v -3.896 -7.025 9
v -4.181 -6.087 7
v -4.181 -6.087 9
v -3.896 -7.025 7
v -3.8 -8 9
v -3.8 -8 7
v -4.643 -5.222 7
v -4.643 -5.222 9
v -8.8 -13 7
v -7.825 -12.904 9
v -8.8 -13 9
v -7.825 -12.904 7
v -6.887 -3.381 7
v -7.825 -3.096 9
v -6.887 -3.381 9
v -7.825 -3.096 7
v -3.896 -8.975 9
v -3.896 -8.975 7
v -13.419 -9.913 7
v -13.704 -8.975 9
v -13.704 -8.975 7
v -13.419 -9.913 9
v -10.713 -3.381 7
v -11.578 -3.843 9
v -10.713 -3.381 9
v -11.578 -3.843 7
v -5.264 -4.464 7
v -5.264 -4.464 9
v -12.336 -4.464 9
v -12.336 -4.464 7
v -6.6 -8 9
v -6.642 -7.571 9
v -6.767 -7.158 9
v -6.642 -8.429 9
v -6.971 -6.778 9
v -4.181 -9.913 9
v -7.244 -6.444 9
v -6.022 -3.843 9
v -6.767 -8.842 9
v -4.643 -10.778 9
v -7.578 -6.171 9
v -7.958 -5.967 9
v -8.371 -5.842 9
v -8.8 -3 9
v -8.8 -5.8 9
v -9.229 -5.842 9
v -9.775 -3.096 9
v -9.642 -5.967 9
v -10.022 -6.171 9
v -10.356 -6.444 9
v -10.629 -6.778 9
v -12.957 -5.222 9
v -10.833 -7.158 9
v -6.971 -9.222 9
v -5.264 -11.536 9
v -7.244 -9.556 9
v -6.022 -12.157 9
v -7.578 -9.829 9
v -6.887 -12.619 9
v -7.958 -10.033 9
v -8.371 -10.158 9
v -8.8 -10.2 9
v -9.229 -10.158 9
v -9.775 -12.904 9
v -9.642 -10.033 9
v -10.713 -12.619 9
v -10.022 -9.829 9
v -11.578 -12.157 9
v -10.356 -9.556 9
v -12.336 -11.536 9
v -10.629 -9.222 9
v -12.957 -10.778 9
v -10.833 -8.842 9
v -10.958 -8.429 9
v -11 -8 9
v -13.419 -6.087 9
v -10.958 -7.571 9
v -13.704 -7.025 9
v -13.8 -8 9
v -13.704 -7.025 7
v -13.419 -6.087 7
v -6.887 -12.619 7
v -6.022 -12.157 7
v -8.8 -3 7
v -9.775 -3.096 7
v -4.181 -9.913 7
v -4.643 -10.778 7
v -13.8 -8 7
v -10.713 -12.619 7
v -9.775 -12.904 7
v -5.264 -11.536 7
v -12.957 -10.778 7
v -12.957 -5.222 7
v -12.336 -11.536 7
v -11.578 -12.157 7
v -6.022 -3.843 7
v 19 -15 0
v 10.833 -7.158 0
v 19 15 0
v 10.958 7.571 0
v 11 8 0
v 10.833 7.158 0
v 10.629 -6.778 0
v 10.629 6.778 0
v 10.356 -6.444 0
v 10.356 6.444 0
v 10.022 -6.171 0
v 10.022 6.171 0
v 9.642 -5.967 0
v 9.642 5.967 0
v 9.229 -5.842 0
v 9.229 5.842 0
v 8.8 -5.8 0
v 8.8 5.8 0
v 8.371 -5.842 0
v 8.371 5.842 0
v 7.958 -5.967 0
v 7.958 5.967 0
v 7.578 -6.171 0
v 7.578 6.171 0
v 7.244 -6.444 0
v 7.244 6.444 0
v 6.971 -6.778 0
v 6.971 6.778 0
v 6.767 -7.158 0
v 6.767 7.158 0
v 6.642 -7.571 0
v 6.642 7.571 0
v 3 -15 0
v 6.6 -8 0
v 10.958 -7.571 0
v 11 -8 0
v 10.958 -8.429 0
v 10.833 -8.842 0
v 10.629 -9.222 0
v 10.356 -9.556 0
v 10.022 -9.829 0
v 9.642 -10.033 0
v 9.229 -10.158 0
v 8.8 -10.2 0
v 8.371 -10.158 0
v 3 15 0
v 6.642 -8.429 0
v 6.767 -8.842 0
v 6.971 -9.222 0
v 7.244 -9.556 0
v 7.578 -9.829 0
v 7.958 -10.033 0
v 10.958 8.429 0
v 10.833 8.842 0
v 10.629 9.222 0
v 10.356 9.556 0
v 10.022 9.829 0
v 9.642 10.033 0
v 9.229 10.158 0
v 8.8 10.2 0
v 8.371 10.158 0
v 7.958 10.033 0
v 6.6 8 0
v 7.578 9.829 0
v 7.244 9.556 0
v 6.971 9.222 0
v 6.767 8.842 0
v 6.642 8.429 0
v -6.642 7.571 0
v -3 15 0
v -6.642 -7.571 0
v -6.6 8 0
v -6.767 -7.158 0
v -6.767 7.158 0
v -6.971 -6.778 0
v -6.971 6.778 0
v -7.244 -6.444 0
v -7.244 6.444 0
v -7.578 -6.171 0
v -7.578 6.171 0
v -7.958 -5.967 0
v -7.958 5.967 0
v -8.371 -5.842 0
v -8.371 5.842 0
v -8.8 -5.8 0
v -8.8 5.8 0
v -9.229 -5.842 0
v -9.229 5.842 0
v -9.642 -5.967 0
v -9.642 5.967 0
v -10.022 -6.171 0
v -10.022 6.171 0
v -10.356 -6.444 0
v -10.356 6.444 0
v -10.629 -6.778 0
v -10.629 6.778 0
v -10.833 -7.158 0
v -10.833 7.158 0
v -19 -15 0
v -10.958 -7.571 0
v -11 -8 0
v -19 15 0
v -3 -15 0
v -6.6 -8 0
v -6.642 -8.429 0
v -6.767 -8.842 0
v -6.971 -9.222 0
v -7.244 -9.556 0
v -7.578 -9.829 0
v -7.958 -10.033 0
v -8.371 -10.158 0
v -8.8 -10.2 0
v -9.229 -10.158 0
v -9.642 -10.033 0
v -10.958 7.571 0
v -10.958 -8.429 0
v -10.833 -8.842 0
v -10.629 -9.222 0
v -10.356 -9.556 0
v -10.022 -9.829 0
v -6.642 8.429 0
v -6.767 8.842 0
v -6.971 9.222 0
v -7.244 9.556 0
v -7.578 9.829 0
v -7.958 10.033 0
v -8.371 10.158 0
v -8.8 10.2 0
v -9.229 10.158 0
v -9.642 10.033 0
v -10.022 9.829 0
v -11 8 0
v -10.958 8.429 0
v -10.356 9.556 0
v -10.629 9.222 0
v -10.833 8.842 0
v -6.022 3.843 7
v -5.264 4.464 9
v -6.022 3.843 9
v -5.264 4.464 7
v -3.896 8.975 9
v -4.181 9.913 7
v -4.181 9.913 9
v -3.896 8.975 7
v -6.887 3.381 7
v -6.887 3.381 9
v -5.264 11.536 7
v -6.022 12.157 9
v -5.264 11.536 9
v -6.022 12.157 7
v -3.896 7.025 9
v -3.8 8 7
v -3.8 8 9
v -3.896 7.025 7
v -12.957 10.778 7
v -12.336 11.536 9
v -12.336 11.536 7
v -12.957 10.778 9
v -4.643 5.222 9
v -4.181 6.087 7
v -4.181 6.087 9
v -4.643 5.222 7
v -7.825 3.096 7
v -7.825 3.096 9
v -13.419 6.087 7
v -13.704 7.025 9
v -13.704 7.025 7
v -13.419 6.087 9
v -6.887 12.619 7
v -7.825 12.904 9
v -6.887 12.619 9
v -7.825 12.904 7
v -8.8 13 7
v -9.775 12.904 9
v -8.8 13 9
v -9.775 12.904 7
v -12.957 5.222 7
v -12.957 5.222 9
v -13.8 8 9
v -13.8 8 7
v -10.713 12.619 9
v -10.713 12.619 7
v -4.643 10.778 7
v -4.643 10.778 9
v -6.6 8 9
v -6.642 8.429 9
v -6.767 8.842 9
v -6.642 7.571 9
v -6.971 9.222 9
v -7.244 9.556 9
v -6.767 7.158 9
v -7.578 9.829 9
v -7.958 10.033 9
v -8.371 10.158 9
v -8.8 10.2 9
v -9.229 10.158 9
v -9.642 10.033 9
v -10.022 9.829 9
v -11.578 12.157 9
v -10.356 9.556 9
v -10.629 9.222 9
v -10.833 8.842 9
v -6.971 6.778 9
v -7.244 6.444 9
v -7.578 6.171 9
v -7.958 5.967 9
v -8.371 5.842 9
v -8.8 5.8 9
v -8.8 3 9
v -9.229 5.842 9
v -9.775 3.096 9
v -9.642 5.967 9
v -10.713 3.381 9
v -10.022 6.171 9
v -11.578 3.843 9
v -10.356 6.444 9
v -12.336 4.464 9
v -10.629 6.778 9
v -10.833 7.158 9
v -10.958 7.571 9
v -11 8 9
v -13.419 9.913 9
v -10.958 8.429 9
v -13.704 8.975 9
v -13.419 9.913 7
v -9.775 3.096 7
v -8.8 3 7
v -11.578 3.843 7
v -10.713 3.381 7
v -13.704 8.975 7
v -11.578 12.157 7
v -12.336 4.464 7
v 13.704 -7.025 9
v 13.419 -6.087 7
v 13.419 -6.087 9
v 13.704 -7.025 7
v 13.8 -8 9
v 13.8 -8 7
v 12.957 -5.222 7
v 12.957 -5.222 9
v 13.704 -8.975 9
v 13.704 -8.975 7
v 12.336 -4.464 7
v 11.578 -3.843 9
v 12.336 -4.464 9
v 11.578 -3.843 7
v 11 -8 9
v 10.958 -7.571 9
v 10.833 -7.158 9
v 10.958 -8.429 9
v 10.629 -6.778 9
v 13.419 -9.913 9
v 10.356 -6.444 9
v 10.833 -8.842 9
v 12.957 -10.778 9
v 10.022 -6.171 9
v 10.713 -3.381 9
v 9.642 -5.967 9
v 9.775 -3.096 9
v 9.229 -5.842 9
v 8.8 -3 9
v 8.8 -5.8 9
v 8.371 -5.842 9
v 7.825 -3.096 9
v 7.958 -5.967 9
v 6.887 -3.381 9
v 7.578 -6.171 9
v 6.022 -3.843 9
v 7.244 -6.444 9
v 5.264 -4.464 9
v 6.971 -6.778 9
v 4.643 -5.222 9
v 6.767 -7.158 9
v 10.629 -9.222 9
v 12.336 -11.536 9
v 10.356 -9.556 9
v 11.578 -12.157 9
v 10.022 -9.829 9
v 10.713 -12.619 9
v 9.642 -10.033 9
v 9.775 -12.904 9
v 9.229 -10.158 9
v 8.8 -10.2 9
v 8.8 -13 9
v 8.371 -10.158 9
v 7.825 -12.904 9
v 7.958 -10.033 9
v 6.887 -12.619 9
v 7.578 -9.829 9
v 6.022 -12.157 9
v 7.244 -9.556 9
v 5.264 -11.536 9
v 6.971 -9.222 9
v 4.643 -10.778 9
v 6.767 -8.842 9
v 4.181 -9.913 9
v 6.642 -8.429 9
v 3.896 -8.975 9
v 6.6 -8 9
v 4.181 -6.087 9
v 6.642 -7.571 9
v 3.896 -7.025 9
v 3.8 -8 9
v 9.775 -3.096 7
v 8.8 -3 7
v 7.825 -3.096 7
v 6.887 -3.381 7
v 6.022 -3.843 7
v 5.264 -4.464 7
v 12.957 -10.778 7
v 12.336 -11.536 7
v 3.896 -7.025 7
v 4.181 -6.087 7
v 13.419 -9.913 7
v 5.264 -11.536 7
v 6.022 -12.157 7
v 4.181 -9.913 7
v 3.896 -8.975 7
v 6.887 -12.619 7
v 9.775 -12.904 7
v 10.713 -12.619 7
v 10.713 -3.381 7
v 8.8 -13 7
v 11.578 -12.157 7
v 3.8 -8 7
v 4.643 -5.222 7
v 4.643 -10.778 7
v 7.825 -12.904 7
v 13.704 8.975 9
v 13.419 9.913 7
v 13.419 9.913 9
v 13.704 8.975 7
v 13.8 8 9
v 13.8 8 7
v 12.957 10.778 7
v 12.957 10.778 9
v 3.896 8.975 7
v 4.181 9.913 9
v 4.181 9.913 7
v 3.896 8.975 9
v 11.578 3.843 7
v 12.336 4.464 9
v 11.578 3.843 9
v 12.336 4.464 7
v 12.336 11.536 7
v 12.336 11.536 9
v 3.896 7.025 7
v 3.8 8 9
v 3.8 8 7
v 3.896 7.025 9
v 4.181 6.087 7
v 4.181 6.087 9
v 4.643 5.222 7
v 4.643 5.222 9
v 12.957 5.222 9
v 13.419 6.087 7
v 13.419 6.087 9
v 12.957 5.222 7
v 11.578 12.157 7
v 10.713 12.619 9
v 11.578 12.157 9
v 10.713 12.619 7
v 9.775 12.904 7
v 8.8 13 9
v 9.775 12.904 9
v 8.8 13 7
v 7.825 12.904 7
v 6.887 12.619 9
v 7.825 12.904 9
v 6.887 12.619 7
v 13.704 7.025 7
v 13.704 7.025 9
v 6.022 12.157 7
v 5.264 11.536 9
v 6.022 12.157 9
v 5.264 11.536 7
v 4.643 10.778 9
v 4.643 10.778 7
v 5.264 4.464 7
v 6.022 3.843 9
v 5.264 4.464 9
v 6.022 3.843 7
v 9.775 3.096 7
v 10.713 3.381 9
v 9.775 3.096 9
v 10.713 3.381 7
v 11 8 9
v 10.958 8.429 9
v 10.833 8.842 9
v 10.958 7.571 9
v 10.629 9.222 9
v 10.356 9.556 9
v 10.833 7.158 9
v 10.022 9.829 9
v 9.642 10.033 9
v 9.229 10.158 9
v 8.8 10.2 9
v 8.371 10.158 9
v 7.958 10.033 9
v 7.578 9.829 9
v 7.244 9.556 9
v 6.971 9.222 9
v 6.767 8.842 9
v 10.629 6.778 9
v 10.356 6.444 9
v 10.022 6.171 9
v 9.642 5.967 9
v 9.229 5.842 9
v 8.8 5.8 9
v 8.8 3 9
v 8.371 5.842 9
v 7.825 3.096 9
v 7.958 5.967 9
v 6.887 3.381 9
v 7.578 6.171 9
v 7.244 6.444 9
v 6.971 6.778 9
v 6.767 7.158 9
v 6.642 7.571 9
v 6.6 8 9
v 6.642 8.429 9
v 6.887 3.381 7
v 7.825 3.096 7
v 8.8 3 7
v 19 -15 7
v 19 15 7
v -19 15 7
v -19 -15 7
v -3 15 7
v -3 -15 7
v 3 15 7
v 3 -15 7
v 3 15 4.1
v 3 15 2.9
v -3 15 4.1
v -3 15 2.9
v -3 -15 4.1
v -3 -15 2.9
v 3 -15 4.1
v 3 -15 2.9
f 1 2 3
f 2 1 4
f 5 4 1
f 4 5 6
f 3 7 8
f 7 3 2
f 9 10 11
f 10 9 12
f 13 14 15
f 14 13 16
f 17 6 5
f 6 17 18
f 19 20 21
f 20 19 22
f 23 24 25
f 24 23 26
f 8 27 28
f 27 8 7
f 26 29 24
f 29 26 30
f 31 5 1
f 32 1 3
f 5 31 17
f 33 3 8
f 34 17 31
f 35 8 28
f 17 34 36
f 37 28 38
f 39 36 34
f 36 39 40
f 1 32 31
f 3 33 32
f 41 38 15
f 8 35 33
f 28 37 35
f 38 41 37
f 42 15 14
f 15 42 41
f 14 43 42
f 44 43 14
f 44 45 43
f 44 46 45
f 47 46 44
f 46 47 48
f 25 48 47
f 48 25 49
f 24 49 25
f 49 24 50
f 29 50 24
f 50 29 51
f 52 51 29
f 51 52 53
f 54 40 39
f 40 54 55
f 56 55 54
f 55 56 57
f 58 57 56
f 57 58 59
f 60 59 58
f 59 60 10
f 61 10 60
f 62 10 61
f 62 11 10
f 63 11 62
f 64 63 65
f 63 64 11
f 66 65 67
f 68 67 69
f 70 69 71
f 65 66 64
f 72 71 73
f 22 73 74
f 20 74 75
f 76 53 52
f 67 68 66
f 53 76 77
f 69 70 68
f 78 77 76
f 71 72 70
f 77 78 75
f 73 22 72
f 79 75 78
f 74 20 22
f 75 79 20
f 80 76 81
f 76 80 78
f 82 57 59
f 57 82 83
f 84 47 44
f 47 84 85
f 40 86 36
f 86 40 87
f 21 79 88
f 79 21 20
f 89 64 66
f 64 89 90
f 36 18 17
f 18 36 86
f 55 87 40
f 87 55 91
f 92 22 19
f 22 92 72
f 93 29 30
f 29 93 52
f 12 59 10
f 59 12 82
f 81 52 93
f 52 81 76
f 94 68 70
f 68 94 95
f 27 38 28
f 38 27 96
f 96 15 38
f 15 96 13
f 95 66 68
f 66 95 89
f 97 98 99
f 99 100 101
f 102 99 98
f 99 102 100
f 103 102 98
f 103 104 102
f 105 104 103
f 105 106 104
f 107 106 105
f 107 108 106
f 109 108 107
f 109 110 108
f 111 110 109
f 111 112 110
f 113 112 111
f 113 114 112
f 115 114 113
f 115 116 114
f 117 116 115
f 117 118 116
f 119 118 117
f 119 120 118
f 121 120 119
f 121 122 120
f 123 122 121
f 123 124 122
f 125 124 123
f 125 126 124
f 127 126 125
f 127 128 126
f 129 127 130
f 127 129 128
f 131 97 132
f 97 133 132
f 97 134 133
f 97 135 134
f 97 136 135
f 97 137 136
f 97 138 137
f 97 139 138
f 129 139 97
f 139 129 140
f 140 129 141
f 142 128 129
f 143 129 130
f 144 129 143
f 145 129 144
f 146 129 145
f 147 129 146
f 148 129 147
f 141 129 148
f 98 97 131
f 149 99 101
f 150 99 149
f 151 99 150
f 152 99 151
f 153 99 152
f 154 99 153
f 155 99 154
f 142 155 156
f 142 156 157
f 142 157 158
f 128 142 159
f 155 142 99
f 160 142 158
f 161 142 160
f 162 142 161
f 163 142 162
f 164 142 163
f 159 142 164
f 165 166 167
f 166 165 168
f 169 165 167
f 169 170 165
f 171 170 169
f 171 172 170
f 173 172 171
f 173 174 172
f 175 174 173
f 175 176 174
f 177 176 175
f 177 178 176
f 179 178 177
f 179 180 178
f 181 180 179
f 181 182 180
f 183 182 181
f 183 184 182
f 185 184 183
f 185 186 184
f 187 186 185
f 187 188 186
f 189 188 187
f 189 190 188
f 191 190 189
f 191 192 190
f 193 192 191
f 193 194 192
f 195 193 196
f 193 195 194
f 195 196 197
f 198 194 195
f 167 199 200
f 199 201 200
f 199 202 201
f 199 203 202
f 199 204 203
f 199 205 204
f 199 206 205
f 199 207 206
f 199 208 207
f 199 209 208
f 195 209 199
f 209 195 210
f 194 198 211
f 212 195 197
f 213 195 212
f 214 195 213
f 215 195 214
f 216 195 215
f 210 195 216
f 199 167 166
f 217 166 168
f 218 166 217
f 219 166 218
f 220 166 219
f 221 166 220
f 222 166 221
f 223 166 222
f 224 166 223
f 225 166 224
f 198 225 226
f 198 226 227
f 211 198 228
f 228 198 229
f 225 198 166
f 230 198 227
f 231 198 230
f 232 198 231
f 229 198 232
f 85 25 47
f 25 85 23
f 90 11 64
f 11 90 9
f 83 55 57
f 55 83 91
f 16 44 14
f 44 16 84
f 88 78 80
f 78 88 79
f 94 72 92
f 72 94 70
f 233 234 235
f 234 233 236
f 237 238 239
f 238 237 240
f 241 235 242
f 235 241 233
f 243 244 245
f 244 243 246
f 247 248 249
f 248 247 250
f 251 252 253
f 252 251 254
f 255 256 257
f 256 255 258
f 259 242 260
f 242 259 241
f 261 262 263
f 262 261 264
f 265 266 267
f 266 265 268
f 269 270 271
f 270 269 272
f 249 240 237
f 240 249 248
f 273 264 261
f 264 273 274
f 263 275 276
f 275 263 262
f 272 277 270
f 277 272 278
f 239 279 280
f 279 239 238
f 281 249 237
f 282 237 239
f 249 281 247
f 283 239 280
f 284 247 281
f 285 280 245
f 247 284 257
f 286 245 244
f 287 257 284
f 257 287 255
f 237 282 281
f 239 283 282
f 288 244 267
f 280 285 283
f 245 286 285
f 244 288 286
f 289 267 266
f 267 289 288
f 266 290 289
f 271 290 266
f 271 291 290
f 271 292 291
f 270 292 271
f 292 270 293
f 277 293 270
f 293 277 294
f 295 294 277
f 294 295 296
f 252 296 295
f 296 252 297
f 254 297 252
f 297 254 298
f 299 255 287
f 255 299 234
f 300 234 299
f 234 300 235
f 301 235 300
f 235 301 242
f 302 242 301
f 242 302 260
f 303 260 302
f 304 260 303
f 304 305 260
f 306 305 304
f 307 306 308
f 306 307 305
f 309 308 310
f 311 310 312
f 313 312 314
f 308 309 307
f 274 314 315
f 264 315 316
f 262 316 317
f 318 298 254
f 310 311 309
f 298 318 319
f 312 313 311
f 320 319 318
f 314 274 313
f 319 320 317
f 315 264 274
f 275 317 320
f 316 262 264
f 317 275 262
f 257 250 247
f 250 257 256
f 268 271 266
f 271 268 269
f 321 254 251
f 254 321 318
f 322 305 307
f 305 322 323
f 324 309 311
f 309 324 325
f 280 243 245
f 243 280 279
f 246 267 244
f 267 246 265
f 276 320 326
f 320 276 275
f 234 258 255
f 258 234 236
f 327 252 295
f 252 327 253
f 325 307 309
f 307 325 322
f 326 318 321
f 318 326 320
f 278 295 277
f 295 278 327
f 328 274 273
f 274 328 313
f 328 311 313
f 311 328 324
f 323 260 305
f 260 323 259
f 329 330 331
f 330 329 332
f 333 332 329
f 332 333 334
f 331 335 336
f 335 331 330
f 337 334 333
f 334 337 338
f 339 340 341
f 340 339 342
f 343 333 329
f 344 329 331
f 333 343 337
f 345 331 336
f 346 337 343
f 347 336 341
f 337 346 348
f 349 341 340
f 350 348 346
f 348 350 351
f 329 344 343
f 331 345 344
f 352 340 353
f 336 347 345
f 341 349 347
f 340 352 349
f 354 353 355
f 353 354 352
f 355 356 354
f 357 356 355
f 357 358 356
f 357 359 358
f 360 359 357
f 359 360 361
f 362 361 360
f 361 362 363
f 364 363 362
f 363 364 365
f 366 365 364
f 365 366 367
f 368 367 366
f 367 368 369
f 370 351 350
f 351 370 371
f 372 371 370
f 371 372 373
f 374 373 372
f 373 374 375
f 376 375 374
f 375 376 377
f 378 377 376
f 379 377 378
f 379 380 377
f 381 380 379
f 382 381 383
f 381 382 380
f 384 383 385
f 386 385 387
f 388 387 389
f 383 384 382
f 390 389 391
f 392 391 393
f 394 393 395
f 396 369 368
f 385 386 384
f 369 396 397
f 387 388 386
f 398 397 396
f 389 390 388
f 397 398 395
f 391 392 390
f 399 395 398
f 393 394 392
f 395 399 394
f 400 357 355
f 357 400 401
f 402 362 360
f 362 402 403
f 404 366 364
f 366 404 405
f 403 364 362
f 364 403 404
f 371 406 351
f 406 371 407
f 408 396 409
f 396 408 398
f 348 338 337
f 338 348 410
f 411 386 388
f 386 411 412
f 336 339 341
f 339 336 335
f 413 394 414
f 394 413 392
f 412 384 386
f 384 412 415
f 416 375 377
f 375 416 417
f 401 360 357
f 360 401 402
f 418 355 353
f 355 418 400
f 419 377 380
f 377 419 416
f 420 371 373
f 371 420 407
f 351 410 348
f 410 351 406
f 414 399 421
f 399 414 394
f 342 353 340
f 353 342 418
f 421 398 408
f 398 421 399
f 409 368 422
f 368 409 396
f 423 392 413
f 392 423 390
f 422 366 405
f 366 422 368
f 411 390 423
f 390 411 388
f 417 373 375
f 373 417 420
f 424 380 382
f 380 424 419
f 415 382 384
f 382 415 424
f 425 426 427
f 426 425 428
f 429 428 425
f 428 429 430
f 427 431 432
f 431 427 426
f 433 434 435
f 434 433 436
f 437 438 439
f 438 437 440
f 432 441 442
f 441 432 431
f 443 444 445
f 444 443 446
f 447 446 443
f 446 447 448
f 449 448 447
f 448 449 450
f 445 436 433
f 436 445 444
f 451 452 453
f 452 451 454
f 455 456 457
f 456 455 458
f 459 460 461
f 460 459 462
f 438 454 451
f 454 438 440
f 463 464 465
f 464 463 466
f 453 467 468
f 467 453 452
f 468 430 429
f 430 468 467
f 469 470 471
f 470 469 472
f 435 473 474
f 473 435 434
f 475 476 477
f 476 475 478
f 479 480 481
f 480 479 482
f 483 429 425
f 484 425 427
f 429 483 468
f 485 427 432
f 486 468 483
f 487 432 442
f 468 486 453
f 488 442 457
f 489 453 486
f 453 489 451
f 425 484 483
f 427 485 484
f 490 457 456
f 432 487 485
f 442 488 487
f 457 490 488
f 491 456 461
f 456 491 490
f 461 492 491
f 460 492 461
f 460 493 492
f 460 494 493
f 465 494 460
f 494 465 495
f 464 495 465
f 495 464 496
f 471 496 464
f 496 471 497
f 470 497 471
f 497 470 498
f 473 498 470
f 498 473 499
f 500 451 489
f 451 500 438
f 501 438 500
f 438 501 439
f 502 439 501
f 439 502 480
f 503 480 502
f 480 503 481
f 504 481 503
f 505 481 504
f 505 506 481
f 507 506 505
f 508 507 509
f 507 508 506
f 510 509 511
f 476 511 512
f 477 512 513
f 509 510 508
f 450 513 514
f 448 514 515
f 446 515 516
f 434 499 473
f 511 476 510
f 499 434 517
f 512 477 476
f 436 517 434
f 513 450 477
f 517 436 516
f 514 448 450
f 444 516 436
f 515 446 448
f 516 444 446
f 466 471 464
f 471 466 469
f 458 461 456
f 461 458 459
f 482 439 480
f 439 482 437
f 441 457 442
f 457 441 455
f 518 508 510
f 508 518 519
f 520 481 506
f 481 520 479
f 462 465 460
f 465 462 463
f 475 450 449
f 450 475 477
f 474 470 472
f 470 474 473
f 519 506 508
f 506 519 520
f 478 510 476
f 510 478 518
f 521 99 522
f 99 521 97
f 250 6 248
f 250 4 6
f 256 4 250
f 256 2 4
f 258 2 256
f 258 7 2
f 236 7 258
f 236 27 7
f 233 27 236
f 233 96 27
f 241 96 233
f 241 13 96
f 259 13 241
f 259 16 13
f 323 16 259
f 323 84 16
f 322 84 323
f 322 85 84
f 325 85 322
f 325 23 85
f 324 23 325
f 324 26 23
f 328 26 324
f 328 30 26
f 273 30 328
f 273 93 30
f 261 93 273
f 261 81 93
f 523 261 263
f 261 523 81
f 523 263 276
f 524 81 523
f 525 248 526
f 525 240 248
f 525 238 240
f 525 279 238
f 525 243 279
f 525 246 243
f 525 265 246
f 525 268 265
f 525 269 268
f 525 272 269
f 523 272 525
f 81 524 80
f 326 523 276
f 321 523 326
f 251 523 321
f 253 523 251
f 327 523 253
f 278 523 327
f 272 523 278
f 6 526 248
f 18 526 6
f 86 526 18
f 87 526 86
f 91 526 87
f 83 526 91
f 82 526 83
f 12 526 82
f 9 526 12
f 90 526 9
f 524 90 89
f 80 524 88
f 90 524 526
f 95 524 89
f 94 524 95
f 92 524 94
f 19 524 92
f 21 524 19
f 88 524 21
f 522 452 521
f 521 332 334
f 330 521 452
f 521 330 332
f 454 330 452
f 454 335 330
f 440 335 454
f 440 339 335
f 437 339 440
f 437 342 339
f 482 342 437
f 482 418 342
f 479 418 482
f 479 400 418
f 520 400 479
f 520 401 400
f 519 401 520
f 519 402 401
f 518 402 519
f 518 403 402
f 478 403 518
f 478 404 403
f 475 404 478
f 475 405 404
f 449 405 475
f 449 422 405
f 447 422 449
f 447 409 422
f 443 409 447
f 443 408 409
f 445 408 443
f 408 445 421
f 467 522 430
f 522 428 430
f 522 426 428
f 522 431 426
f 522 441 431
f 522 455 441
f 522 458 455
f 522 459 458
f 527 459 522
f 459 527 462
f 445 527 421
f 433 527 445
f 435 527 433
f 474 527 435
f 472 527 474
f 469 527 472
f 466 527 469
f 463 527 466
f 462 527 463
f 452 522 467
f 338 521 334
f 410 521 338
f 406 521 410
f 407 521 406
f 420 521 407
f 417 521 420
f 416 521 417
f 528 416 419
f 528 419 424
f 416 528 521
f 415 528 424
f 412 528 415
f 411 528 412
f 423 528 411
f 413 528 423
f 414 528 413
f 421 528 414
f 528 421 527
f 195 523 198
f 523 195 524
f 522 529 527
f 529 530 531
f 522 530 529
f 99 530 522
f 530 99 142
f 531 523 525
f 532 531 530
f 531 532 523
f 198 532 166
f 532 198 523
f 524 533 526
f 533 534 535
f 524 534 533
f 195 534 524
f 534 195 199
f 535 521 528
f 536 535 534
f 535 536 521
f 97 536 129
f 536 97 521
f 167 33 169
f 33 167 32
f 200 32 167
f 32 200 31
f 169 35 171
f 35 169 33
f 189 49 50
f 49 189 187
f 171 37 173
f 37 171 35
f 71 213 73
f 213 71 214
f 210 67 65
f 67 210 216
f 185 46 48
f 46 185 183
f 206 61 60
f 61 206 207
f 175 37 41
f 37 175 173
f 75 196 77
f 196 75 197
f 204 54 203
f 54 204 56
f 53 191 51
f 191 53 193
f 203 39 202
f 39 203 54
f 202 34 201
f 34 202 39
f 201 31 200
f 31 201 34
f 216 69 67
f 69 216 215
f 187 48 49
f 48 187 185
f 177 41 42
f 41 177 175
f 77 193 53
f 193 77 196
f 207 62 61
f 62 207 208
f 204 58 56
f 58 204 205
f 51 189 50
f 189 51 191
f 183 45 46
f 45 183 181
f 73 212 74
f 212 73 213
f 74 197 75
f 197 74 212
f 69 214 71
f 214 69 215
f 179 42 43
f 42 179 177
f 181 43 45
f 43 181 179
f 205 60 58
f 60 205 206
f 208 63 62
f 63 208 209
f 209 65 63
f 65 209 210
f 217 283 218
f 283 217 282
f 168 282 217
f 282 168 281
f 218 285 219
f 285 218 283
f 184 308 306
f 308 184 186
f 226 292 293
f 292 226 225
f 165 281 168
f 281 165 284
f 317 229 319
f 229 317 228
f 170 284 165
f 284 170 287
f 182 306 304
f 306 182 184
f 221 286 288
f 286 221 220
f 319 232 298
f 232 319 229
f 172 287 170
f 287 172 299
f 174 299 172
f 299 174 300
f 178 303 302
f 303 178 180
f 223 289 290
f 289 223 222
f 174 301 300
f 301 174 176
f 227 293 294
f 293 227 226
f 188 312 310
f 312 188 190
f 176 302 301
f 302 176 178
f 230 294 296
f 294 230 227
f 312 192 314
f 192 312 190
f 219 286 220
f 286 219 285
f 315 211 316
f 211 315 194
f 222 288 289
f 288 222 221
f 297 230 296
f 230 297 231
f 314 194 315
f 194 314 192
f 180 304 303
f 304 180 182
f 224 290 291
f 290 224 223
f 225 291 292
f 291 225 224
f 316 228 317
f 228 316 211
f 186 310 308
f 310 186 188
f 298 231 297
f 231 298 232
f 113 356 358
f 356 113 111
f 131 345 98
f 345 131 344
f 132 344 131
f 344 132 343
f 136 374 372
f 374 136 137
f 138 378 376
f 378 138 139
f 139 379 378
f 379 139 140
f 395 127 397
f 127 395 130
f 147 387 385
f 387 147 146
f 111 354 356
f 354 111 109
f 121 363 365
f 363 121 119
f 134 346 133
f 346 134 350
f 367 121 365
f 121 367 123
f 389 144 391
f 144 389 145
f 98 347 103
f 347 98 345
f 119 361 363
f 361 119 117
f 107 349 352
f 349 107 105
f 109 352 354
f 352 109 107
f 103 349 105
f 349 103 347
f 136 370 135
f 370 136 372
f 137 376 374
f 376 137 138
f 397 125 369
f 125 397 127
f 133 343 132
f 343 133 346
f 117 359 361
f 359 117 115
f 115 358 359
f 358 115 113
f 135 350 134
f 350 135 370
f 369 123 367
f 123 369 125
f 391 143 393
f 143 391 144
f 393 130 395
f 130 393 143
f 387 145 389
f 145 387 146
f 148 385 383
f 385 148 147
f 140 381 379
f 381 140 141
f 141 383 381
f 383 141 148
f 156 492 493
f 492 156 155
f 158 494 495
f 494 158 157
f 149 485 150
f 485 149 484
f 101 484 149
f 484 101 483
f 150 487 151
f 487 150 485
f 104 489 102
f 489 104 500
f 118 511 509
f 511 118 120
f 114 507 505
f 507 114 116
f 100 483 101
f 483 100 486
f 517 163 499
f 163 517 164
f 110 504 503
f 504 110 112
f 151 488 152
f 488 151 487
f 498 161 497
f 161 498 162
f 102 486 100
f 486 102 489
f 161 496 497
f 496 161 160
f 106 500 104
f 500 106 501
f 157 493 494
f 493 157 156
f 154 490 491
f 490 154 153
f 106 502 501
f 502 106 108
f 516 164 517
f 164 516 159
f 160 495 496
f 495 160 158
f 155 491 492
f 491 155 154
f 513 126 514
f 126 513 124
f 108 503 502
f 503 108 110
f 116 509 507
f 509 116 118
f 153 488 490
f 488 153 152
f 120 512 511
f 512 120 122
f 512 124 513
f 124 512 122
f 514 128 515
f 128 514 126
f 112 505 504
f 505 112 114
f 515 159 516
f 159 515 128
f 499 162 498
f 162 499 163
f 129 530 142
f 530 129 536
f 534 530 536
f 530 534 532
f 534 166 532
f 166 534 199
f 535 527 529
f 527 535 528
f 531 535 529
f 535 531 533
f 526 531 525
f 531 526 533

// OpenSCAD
$fn = 32;

// ----------------------------------------------------------------------
// Living hinge: 38 x 30 mm plates, 1.2 mm flexible web
// ----------------------------------------------------------------------

// --- parameters (mm) ---
plate_len = 16;           // plate length outside the web
plate_w = 30;             // plate width
thick = 7;                // plate thickness
web_half = 3;             // half width of the flex band
web_t = 1.2;              // flexible web thickness
web_z = 2.9;              // web position inside the thickness
boss_d = 10;              // screw boss diameter
boss_h = 9;               // screw boss height
boss_x = 8.8;             // screw boss distance from the web
screw_d = 4.4;            // screw hole

difference() {
  union() {
    /* one flat strip, later thinned at the middle */
    translate([-19, -15, 0]) cube([38, 30, 7]);
    /* screw bosses, sunk 0.5 mm into the plates */
    for (sx = [-8.8, 8.8]) {
      for (sy = [-8, 8]) {
        translate([sx, sy, 0]) cylinder(h = boss_h, d = boss_d);
      }
    }
  }
  /* channel from below: leaves the web on top of it */
  translate([-3, -17.5, -2.5]) cube([6, 35, 5.4]);
  /* channel from above: thins the web down to web_t */
  translate([-3, -17.5, 4.1]) cube([6, 35, 5.4]);
  /* screw holes through the bosses */
  for (sx = [-8.8, 8.8]) {
    for (sy = [-8, 8]) {
      translate([sx, sy, -2.5]) cylinder(h = boss_h + 5, d = screw_d);
    }
  }
}
